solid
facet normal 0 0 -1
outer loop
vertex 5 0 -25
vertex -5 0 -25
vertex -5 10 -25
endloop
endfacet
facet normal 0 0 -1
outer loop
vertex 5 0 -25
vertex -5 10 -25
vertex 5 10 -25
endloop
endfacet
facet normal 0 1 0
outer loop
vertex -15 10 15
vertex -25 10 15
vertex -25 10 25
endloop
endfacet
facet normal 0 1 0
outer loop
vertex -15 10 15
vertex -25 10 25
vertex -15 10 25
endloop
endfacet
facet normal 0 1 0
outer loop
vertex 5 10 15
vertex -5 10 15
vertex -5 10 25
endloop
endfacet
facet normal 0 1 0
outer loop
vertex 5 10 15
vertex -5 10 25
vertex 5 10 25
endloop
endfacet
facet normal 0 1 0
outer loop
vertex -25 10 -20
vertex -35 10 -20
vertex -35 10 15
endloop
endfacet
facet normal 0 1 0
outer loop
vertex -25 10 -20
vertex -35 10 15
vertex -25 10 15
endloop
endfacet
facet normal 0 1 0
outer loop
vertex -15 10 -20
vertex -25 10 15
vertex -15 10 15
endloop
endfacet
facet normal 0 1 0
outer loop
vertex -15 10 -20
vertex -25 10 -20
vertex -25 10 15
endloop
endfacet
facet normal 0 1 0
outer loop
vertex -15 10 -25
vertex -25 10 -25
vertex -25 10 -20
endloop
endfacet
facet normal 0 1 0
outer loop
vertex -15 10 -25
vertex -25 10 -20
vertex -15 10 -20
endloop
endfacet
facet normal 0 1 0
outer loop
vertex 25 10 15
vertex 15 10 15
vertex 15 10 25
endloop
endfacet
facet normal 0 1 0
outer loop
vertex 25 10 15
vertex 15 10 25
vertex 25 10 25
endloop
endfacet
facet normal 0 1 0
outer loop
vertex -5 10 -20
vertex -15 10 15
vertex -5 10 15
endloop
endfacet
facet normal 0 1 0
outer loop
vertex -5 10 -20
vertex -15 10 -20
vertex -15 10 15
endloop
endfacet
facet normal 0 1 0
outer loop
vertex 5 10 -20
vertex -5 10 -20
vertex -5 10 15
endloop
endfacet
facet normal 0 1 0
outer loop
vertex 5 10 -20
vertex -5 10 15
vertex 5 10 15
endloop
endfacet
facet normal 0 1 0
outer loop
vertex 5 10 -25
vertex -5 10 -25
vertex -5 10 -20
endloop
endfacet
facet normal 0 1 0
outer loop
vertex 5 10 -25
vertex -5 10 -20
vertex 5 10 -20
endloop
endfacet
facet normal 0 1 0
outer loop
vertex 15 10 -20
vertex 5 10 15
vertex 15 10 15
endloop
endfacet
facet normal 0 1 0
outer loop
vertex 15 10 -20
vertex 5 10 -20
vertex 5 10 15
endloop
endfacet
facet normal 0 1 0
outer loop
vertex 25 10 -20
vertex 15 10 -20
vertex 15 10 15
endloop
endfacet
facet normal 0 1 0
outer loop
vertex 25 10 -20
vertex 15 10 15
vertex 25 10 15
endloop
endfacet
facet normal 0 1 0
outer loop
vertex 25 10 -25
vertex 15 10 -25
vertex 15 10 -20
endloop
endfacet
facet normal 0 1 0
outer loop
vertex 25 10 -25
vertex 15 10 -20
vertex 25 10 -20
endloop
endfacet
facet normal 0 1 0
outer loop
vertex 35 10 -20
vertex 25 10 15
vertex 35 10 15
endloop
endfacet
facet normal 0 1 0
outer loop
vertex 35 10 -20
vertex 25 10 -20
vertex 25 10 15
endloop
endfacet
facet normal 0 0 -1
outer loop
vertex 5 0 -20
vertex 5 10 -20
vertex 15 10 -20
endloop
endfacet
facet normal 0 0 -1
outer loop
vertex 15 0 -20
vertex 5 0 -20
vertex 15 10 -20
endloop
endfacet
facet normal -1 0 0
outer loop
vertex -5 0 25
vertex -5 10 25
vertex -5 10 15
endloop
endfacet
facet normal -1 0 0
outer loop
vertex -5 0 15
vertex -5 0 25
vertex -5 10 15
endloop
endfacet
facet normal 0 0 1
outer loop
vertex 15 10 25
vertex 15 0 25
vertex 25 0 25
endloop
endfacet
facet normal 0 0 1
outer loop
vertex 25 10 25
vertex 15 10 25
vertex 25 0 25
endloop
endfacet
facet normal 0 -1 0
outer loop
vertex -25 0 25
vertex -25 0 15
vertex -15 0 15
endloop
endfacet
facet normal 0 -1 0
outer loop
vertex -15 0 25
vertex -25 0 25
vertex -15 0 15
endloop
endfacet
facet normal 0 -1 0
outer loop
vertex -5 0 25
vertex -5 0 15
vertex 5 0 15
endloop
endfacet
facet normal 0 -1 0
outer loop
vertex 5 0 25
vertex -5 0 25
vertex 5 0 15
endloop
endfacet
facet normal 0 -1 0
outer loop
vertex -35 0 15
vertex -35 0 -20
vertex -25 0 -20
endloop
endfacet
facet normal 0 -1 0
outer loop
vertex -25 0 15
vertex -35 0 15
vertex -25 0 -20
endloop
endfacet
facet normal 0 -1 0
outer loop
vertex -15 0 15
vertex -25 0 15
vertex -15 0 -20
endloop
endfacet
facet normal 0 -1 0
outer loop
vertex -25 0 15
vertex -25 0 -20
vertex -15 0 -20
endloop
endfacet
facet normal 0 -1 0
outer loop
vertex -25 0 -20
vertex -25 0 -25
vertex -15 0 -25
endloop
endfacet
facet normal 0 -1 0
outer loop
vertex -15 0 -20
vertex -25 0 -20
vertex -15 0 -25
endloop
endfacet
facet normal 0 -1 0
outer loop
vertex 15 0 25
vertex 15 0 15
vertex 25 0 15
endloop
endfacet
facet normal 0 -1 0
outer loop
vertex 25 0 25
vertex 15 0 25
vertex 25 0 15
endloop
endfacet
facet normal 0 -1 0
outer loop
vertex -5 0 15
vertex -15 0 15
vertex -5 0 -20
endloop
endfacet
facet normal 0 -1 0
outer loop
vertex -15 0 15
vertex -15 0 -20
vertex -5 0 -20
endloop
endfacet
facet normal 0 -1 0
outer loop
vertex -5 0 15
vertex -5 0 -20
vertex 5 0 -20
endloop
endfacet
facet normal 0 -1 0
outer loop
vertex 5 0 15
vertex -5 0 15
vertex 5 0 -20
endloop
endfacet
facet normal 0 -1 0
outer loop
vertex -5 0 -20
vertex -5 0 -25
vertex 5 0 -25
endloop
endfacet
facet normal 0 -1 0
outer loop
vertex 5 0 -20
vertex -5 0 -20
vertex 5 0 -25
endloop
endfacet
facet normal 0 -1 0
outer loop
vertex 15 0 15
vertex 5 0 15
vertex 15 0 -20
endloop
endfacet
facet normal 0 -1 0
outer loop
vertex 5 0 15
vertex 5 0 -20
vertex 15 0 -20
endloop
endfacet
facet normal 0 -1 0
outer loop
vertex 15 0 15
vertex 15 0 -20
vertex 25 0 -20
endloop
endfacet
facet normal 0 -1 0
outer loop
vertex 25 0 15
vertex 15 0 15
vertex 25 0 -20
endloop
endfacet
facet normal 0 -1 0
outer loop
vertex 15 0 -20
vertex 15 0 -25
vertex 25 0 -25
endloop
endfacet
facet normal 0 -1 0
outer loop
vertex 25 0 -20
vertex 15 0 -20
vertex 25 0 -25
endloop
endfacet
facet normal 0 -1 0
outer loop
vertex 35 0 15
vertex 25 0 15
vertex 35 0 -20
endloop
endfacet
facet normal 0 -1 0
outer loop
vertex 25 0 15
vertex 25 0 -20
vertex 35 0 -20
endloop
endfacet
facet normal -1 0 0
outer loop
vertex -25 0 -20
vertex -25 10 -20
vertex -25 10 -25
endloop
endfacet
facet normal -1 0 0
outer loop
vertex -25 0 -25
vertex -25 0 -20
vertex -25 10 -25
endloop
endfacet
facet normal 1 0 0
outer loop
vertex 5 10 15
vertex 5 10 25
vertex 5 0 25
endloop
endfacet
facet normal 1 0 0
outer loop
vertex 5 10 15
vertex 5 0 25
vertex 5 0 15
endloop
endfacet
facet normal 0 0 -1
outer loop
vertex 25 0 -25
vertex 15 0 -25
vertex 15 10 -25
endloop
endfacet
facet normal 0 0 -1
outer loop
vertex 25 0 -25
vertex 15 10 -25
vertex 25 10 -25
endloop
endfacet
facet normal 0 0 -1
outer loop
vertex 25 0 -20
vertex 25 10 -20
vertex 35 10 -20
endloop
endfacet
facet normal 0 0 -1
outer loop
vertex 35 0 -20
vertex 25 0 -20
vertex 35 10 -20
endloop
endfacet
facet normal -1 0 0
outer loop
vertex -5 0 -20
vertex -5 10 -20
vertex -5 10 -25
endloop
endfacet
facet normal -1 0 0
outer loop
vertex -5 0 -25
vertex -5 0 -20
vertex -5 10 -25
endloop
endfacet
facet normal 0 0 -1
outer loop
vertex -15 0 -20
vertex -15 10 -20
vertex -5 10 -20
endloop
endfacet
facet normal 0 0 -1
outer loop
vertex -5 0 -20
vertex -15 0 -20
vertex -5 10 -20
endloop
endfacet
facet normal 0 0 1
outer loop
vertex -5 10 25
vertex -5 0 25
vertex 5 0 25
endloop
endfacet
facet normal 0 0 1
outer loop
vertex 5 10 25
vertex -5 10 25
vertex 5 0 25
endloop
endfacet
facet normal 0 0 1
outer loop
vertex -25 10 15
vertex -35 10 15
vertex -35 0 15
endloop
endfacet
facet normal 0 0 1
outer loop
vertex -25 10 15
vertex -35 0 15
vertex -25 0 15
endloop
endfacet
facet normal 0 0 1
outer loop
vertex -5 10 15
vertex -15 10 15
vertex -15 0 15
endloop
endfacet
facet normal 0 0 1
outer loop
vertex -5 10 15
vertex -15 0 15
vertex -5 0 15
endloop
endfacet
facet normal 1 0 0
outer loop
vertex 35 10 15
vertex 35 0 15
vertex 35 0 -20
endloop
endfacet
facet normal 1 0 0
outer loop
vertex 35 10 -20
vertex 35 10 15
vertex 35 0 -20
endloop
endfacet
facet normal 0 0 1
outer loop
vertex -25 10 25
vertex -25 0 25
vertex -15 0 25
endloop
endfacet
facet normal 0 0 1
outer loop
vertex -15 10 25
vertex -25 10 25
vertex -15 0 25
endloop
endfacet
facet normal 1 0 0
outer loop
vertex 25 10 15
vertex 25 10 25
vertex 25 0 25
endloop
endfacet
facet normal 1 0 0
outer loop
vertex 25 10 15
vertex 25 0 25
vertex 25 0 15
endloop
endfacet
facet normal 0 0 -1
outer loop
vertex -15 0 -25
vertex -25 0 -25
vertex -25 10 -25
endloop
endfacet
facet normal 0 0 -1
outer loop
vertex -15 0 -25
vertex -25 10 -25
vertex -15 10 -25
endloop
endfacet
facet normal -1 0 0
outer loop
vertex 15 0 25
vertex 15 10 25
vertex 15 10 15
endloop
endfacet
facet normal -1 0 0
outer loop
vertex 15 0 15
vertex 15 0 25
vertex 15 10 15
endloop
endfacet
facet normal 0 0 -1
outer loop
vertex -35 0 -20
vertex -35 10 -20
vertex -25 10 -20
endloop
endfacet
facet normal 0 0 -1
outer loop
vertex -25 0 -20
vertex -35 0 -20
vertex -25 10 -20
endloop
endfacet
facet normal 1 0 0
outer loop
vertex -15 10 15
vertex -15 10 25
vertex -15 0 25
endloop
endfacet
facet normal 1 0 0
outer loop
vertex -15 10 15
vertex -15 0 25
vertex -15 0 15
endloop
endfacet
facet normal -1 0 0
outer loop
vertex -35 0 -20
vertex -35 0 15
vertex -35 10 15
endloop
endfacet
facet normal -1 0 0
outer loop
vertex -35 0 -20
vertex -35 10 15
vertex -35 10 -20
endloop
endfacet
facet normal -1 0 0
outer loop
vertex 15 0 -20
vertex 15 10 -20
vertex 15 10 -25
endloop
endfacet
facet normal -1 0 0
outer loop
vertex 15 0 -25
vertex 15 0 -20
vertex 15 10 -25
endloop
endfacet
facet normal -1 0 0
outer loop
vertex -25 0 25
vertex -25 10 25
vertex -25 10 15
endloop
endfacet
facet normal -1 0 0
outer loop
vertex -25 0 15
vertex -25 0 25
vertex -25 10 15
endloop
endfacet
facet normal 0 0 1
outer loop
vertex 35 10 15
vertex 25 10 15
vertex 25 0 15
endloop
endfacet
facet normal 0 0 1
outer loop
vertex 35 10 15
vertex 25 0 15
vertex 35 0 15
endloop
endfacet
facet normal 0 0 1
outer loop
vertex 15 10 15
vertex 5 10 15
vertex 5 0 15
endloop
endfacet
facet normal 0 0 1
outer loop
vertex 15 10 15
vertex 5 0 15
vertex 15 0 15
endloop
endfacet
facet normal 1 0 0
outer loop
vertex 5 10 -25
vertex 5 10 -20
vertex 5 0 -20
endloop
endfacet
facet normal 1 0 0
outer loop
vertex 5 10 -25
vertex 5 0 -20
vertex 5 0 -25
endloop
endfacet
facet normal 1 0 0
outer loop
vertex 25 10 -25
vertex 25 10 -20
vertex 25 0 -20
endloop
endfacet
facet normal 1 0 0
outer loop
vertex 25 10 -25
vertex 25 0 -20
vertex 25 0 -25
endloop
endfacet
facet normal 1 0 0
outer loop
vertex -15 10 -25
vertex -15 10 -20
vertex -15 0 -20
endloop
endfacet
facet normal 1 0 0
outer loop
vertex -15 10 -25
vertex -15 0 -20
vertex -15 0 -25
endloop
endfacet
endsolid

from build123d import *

# Parameters (mm, degrees)
SKETCH1_W           = 70
SKETCH1_H           = 50
BOSS_EXTRUDE1_DEPTH = 10
SKETCH2_W           = 10
SKETCH2_H           = 5
SKETCH2_H_2         = 10
CUT_EXTRUDE1_DEPTH  = 45.158804332
LPATTERN1_COUNT     = 4
LPATTERN1_PITCH     = 20


with BuildPart() as part:
    # Sketch1 → Boss-Extrude1 (new body)
    with BuildSketch(Plane(origin=(0, 0, 0), x_dir=(1, 0, 0), z_dir=(0, 1, 0))):
        Rectangle(SKETCH1_W, SKETCH1_H)
    extrude(amount=BOSS_EXTRUDE1_DEPTH)

    # Sketch2 → Cut-Extrude1 (cut, through all)
    with BuildSketch(Plane(origin=(0, 10, 0), x_dir=(1, 0, 0), z_dir=(0, 1, 0))):
        with Locations((-30, 22.5)):
            Rectangle(SKETCH2_W, SKETCH2_H)
        with Locations((-30, -20)):
            Rectangle(SKETCH2_W, SKETCH2_H_2)
    cut_extrude1 = extrude(amount=-CUT_EXTRUDE1_DEPTH, mode=Mode.SUBTRACT)

    # LPattern1: Cut-Extrude1 ×4
    with Locations(*[(i * LPATTERN1_PITCH, 0, 0) for i in range(1, LPATTERN1_COUNT)]):
        add(cut_extrude1, mode=Mode.SUBTRACT)


solid = part.part
